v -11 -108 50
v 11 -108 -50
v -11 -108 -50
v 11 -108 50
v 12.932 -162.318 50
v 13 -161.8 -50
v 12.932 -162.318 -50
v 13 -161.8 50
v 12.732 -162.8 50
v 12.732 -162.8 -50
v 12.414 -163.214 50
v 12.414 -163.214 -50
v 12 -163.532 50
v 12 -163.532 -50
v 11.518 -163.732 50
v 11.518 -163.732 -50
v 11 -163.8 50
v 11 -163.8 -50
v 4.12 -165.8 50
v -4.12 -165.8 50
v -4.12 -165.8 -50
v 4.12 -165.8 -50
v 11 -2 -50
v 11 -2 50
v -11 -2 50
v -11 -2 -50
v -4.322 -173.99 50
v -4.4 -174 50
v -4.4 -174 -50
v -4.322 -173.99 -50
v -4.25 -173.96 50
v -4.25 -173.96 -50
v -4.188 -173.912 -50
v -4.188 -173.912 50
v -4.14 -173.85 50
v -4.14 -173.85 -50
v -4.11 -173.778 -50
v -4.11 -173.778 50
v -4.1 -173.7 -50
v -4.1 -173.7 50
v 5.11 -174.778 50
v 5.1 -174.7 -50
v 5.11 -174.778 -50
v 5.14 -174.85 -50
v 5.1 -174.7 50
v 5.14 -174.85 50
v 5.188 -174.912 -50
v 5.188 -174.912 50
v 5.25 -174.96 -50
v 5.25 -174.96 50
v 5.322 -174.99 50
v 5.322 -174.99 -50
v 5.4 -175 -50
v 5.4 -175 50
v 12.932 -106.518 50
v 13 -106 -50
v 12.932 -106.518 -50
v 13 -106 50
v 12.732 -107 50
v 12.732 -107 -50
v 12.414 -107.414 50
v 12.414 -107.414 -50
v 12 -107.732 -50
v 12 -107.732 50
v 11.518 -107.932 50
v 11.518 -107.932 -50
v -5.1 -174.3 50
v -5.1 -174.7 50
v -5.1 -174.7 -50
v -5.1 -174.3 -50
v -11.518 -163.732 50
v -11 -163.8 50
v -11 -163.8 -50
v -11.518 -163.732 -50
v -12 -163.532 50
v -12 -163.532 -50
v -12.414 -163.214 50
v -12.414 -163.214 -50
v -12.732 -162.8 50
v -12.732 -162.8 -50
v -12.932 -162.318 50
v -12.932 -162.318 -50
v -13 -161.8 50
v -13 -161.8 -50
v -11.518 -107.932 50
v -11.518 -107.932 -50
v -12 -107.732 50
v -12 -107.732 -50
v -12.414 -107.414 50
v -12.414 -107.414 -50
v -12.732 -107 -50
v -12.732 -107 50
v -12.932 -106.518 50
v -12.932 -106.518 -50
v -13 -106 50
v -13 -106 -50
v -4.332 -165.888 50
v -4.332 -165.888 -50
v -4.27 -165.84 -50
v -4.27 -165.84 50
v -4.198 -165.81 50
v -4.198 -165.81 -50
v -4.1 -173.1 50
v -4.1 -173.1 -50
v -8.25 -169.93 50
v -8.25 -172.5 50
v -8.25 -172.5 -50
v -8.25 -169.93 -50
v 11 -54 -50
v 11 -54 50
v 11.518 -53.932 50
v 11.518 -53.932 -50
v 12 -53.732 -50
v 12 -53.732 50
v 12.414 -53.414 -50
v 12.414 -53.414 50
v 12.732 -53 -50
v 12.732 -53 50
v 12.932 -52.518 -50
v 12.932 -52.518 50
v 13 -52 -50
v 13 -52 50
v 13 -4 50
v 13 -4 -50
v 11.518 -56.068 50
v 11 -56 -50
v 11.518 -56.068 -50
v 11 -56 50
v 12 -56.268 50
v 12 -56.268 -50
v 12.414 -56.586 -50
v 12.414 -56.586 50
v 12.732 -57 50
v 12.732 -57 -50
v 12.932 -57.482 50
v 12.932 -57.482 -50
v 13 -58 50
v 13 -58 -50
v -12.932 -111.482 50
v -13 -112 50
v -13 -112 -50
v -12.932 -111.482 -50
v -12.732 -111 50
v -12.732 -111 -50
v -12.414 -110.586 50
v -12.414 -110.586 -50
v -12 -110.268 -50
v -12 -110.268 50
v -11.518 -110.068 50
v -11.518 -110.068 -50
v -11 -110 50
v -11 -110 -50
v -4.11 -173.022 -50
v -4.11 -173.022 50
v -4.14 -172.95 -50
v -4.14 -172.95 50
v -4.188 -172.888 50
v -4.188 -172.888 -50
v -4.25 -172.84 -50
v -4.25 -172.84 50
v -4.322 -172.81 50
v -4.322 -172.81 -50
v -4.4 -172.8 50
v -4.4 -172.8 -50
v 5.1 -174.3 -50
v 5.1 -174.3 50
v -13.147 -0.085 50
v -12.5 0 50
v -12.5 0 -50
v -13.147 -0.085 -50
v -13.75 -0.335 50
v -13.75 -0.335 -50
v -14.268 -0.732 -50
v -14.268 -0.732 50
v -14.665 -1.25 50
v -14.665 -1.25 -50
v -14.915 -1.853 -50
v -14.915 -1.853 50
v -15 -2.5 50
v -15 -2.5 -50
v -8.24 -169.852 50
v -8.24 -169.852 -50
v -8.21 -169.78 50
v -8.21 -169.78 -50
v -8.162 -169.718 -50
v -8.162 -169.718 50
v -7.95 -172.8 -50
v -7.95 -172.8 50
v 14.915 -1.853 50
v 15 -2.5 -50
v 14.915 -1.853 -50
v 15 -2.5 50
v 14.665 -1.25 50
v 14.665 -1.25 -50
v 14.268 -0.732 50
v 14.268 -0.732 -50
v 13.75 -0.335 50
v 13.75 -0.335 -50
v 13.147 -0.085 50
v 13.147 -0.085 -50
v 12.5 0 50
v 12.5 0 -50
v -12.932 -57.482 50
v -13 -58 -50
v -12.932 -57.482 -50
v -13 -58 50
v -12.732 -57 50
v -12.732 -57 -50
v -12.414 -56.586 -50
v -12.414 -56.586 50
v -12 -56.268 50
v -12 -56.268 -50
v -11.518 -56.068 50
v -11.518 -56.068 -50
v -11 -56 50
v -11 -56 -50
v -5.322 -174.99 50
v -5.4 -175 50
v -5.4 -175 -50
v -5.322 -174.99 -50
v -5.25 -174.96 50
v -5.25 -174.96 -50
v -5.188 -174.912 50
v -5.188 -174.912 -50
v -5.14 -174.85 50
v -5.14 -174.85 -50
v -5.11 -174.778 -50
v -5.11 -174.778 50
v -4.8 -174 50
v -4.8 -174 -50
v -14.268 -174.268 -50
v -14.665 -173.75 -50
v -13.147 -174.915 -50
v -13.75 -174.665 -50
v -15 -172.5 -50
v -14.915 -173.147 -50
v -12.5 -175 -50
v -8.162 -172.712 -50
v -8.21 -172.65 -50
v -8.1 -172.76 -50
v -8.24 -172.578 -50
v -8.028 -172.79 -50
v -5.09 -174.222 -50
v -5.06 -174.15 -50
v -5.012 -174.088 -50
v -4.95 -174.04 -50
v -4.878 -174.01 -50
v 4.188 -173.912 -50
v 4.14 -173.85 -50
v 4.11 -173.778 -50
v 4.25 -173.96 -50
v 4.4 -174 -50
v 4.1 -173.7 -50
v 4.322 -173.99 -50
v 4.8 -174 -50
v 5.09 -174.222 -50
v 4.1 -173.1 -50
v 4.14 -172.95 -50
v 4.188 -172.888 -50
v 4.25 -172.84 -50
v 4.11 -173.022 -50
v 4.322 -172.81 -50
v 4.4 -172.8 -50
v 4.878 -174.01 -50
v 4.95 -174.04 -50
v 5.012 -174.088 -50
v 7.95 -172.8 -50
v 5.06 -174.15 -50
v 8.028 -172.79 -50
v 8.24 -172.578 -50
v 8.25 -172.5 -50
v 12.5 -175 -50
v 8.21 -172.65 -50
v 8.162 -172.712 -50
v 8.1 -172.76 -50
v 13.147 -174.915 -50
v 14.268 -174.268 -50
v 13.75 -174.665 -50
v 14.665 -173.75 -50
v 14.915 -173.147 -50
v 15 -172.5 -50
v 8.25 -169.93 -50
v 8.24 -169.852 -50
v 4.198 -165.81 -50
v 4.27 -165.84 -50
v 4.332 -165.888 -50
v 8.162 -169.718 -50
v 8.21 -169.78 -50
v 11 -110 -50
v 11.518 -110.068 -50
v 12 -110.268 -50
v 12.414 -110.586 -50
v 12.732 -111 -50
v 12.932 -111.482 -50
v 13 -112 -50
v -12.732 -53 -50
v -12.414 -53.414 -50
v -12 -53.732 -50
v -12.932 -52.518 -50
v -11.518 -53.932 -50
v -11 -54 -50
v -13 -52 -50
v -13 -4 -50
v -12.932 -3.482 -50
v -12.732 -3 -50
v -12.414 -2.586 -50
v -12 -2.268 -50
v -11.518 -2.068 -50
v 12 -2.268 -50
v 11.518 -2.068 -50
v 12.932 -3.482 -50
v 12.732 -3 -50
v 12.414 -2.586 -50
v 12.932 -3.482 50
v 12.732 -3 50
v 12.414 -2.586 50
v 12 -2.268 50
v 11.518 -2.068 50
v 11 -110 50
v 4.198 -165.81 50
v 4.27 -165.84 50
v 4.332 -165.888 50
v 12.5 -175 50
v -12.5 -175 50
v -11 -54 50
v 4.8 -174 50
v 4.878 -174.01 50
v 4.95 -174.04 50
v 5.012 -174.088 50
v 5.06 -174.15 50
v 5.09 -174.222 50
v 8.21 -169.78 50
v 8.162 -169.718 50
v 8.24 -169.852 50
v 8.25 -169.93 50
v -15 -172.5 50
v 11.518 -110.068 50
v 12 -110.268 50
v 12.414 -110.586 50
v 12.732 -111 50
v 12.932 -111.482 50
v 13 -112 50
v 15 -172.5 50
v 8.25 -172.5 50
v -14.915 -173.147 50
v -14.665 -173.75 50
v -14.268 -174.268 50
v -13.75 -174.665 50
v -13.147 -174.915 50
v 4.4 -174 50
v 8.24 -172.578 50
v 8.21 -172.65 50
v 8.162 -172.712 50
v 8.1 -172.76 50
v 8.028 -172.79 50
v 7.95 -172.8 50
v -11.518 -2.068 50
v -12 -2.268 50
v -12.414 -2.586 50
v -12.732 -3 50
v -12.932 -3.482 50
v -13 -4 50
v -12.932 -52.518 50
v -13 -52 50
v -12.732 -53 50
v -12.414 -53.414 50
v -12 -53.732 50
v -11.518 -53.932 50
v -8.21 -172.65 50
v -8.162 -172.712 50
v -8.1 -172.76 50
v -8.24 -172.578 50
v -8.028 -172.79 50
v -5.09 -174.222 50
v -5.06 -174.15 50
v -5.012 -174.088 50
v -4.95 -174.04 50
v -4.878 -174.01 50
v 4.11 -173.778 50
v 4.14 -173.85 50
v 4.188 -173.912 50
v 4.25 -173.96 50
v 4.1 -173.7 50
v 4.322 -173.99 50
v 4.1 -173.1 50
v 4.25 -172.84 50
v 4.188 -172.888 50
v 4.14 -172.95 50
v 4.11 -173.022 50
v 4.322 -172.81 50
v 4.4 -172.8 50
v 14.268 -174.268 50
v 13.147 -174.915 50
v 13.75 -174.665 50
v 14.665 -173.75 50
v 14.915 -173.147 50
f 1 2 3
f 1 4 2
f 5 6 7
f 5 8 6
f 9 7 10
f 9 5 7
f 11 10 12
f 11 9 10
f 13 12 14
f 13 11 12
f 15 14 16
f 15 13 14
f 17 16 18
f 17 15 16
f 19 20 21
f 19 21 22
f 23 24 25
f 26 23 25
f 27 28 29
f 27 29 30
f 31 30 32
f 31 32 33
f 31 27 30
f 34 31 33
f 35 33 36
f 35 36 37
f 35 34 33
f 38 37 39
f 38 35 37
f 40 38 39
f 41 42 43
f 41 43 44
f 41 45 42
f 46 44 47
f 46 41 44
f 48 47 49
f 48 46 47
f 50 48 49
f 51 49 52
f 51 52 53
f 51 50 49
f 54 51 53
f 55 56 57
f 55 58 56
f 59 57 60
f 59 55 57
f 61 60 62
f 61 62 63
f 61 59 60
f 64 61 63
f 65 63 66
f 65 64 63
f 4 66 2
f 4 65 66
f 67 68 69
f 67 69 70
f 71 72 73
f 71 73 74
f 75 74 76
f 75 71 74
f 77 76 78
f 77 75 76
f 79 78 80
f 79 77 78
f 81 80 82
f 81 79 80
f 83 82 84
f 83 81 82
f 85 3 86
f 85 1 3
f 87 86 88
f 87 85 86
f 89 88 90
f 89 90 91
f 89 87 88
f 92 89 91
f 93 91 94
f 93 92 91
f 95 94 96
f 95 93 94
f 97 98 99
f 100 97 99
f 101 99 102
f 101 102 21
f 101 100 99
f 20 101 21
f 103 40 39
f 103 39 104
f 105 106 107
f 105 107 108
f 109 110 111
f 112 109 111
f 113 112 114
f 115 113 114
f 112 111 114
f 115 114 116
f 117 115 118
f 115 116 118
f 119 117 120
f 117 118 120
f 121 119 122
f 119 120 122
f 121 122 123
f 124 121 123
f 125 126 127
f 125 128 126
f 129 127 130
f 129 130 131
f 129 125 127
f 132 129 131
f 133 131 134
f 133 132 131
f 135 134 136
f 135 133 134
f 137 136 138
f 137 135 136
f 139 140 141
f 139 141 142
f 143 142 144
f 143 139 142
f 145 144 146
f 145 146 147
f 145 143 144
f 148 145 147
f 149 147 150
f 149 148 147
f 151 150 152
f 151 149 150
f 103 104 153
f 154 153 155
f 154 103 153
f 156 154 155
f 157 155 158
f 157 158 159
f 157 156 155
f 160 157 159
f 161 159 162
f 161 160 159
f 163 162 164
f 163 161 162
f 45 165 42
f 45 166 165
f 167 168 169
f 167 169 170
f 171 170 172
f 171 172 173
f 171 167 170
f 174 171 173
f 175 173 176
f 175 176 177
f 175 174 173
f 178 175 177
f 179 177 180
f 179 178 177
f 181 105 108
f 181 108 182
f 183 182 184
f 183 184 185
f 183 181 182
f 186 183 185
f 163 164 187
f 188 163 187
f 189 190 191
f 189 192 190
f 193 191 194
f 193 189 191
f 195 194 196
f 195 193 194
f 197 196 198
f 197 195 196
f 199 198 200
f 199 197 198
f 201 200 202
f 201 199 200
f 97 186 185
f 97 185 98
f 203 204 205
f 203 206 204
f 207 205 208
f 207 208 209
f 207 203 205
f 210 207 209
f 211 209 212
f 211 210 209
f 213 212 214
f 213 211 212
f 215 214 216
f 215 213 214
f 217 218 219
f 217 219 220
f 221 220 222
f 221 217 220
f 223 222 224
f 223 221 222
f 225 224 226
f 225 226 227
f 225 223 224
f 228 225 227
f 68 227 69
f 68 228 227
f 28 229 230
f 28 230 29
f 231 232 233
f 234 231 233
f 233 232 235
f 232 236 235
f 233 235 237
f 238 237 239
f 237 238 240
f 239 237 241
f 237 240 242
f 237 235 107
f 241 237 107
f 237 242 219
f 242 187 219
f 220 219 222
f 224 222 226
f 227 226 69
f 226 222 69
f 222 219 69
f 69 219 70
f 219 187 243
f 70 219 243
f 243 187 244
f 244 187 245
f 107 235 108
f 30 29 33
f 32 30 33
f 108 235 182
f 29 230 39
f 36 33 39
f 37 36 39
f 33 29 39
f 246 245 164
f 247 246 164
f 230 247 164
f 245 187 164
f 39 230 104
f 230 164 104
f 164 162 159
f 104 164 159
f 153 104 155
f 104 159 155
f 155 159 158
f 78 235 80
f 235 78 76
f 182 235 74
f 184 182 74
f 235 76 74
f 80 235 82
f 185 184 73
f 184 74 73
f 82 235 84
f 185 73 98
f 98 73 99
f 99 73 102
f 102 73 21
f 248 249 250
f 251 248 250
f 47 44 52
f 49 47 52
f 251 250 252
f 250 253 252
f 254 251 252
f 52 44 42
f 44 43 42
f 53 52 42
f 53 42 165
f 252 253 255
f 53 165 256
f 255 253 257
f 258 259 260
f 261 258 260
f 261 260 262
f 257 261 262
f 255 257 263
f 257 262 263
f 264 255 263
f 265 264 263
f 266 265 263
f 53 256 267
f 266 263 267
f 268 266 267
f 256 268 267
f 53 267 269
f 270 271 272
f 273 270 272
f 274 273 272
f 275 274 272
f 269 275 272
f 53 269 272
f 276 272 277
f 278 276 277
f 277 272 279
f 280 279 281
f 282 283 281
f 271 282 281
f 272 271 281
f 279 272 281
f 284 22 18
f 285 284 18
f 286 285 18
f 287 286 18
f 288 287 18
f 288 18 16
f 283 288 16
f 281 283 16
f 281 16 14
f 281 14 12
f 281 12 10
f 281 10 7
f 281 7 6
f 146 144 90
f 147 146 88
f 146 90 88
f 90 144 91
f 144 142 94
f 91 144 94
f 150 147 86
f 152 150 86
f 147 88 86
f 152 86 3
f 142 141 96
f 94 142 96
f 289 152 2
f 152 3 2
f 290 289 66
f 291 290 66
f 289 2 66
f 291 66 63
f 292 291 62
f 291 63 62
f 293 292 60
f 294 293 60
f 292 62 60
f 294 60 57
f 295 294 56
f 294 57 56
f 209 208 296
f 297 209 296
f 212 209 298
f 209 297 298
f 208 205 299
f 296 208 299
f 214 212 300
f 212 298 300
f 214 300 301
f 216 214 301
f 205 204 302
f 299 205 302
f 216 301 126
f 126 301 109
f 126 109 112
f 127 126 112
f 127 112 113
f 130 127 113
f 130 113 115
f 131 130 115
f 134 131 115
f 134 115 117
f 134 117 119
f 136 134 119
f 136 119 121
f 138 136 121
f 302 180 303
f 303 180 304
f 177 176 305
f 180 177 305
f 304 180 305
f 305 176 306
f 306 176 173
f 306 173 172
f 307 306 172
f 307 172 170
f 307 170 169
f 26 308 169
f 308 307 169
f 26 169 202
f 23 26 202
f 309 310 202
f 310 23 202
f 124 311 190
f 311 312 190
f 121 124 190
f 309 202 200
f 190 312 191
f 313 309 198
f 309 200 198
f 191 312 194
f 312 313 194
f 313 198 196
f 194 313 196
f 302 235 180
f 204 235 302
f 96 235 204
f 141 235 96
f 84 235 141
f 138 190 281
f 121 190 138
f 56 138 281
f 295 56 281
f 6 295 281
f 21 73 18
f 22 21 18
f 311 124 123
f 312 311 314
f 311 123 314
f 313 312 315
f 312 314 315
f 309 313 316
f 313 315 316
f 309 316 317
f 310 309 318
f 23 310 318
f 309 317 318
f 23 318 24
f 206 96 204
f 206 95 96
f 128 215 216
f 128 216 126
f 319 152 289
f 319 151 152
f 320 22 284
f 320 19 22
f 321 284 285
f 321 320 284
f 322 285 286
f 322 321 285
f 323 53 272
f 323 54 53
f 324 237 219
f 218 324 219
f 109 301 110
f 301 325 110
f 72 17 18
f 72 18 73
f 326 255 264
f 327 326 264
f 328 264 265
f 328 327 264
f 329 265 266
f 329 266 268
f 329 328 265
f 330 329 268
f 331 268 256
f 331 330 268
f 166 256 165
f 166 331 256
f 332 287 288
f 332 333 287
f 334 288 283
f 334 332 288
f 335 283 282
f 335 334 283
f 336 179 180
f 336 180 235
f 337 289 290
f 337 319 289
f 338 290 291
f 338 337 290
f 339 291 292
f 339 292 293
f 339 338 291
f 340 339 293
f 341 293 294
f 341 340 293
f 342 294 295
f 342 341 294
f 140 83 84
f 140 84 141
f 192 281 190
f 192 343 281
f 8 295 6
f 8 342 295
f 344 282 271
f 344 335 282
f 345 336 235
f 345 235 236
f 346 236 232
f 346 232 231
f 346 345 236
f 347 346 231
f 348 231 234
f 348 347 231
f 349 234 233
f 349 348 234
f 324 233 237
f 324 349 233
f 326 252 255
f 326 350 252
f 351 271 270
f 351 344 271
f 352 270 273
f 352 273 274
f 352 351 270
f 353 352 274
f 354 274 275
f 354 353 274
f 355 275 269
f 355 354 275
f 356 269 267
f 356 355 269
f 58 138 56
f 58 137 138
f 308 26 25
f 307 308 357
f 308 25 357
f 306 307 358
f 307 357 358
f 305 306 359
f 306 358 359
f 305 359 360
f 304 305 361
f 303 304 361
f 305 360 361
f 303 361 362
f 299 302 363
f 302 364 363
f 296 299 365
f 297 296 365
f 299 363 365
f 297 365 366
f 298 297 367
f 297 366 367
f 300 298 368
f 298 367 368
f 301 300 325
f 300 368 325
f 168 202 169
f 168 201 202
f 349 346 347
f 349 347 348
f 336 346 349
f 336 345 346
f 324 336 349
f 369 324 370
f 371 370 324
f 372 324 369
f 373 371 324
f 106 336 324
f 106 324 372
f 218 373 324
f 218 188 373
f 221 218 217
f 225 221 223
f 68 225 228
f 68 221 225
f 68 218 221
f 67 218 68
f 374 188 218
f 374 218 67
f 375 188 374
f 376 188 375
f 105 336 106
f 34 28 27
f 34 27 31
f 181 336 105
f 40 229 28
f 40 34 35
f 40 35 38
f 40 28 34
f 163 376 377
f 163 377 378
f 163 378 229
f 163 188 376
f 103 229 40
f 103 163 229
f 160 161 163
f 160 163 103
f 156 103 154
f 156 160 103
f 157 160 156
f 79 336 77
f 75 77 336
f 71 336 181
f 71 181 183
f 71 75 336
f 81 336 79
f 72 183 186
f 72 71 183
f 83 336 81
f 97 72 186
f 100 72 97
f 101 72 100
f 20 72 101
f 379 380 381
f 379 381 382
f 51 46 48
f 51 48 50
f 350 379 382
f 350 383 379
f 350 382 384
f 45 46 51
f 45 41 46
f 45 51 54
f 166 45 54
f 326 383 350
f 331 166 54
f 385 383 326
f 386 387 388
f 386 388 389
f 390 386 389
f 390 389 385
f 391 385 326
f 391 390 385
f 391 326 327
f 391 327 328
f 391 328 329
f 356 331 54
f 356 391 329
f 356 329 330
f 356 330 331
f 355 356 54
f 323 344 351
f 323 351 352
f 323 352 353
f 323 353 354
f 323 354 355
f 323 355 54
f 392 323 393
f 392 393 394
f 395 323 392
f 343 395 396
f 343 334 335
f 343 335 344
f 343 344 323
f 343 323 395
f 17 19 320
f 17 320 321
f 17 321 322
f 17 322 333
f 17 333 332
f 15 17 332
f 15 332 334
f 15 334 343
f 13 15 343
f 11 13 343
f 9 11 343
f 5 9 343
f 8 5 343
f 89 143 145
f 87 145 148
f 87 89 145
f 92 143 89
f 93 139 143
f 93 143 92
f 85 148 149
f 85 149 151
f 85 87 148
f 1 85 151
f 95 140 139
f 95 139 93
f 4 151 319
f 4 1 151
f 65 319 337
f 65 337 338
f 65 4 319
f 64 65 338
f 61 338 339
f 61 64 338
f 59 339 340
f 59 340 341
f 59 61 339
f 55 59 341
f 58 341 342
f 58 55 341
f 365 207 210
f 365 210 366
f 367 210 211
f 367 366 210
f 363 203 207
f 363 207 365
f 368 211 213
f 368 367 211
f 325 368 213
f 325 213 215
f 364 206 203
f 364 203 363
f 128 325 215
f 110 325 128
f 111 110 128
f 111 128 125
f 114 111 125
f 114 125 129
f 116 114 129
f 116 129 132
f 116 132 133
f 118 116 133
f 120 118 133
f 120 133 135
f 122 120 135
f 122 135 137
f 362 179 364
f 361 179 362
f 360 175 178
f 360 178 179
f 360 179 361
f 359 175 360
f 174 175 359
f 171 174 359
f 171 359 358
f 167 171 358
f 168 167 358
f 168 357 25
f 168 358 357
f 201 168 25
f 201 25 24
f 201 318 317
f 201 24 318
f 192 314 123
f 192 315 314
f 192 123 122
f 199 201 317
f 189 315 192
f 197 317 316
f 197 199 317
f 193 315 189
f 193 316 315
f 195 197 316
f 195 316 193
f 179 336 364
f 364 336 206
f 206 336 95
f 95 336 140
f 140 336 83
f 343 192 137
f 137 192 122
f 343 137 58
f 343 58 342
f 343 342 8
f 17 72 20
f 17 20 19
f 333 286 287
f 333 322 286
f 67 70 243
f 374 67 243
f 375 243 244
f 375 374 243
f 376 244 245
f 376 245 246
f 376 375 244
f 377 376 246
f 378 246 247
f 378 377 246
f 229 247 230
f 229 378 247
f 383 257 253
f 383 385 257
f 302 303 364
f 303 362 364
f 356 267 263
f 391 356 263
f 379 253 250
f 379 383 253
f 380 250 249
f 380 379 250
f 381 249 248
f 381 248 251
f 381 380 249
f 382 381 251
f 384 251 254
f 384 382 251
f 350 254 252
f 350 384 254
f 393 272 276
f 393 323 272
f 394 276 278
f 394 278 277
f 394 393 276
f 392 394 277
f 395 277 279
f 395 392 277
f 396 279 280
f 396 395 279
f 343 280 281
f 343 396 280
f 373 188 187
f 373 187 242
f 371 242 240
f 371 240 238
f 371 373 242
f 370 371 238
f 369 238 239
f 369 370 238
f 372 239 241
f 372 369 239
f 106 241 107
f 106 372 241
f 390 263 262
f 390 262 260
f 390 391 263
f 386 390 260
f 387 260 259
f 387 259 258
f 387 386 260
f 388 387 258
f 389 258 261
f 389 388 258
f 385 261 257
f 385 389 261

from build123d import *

# Parameters (mm, degrees)
EXTRUDE_1_DEPTH = 50


with BuildPart() as part:
    # 草图1 → 凸台-拉伸1 (new, symmetric)
    with BuildSketch(Plane.XY):
        with BuildLine():
            Line((12.49999999, 0), (-12.49999999, 0))
            ThreePointArc((-12.49999999, 0), (-14.267766942, -0.732233047), (-14.999999989, -2.499999998))
            Line((-14.999999989, -2.499999998), (-14.999999989, -172.500000002))
            ThreePointArc((-14.999999989, -172.500000002), (-14.267766942, -174.267766953), (-12.49999999, -175))
            Line((-12.49999999, -175), (-5.399999995, -175))
            ThreePointArc((-5.399999995, -175), (-5.187867961, -174.912132034), (-5.099999996, -174.7))
            Line((-5.099999996, -174.7), (-5.099999996, -174.300000001))
            ThreePointArc((-5.099999996, -174.300000001), (-5.01213203, -174.087867966), (-4.799999996, -174.000000001))
            Line((-4.799999996, -174.000000001), (-4.399999997, -174.000000001))
            ThreePointArc((-4.399999997, -174.000000001), (-4.187867962, -173.912132035), (-4.099999997, -173.700000001))
            Line((-4.099999997, -173.700000001), (-4.099999997, -173.100000001))
            ThreePointArc((-4.099999997, -173.100000001), (-4.187867962, -172.887867967), (-4.399999997, -172.800000002))
            Line((-4.399999997, -172.800000002), (-7.949999994, -172.800000002))
            ThreePointArc((-7.949999994, -172.800000002), (-8.162132028, -172.712132036), (-8.249999994, -172.500000002))
            Line((-8.249999994, -172.500000002), (-8.249999994, -169.929898991))
            ThreePointArc((-8.249999994, -169.929898991), (-8.227163853, -169.815093962), (-8.162132028, -169.717766957))
            Line((-8.162132028, -169.717766957), (-4.332233044, -165.887867973))
            ThreePointArc((-4.332233044, -165.887867973), (-4.234906039, -165.822836147), (-4.12010101, -165.800000007))
            Line((-4.12010101, -165.800000007), (4.12010101, -165.800000007))
            ThreePointArc((4.12010101, -165.800000007), (4.234906039, -165.822836147), (4.332233044, -165.887867973))
            Line((4.332233044, -165.887867973), (8.162132028, -169.717766957))
            ThreePointArc((8.162132028, -169.717766957), (8.227163854, -169.815093962), (8.249999994, -169.929898991))
            Line((8.249999994, -169.929898991), (8.249999994, -172.500000002))
            ThreePointArc((8.249999994, -172.500000002), (8.162132028, -172.712132036), (7.949999994, -172.800000002))
            Line((7.949999994, -172.800000002), (4.399999997, -172.800000002))
            ThreePointArc((4.399999997, -172.800000002), (4.187867963, -172.887867967), (4.099999997, -173.100000001))
            Line((4.099999997, -173.100000001), (4.099999997, -173.700000001))
            ThreePointArc((4.099999997, -173.700000001), (4.187867963, -173.912132035), (4.399999997, -174.000000001))
            Line((4.399999997, -174.000000001), (4.799999996, -174.000000001))
            ThreePointArc((4.799999996, -174.000000001), (5.01213203, -174.087867966), (5.099999996, -174.300000001))
            Line((5.099999996, -174.300000001), (5.099999996, -174.7))
            ThreePointArc((5.099999996, -174.7), (5.187867962, -174.912132034), (5.399999996, -175))
            Line((5.399999996, -175), (12.49999999, -175))
            ThreePointArc((12.49999999, -175), (14.267766942, -174.267766953), (14.999999989, -172.500000002))
            Line((14.999999989, -172.500000002), (14.999999989, -2.499999998))
            ThreePointArc((14.999999989, -2.499999998), (14.267766942, -0.732233047), (12.49999999, 0))
        make_face()
        with BuildLine():
            Line((10.999999989, -2), (-10.999999989, -2))
            ThreePointArc((-10.999999989, -2), (-12.414213551, -2.585786438), (-12.999999989, -4))
            Line((-12.999999989, -4), (-12.999999989, -52))
            ThreePointArc((-12.999999989, -52), (-12.414213551, -53.414213562), (-10.999999989, -54))
            Line((-10.999999989, -54), (10.999999989, -54))
            ThreePointArc((10.999999989, -54), (12.414213551, -53.414213562), (12.999999989, -52))
            Line((12.999999989, -52), (12.999999989, -4))
            ThreePointArc((12.999999989, -4), (12.414213551, -2.585786438), (10.999999989, -2))
        make_face(mode=Mode.SUBTRACT)
        with BuildLine():
            Line((10.999999989, -163.800000007), (-10.999999989, -163.800000007))
            ThreePointArc((-10.999999989, -163.800000007), (-12.414213551, -163.214213569), (-12.999999989, -161.800000007))
            Line((-12.999999989, -161.800000007), (-12.999999989, -112))
            ThreePointArc((-12.999999989, -112), (-12.414213551, -110.585786438), (-10.999999989, -110))
            Line((-10.999999989, -110), (10.999999989, -110))
            ThreePointArc((10.999999989, -110), (12.414213551, -110.585786438), (12.999999989, -112))
            Line((12.999999989, -112), (12.999999989, -161.800000007))
            ThreePointArc((12.999999989, -161.800000007), (12.414213551, -163.214213569), (10.999999989, -163.800000007))
        make_face(mode=Mode.SUBTRACT)
        with BuildLine():
            Line((-10.999999989, -56), (10.999999989, -56))
            ThreePointArc((10.999999989, -56), (12.414213551, -56.585786438), (12.999999989, -58))
            Line((12.999999989, -58), (12.999999989, -106))
            ThreePointArc((12.999999989, -106), (12.414213551, -107.414213562), (10.999999989, -108))
            Line((10.999999989, -108), (-10.999999989, -108))
            ThreePointArc((-10.999999989, -108), (-12.414213551, -107.414213562), (-12.999999989, -106))
            Line((-12.999999989, -106), (-12.999999989, -58))
            ThreePointArc((-12.999999989, -58), (-12.414213551, -56.585786438), (-10.999999989, -56))
        make_face(mode=Mode.SUBTRACT)
    extrude(amount=EXTRUDE_1_DEPTH, both=True)


solid = part.part
